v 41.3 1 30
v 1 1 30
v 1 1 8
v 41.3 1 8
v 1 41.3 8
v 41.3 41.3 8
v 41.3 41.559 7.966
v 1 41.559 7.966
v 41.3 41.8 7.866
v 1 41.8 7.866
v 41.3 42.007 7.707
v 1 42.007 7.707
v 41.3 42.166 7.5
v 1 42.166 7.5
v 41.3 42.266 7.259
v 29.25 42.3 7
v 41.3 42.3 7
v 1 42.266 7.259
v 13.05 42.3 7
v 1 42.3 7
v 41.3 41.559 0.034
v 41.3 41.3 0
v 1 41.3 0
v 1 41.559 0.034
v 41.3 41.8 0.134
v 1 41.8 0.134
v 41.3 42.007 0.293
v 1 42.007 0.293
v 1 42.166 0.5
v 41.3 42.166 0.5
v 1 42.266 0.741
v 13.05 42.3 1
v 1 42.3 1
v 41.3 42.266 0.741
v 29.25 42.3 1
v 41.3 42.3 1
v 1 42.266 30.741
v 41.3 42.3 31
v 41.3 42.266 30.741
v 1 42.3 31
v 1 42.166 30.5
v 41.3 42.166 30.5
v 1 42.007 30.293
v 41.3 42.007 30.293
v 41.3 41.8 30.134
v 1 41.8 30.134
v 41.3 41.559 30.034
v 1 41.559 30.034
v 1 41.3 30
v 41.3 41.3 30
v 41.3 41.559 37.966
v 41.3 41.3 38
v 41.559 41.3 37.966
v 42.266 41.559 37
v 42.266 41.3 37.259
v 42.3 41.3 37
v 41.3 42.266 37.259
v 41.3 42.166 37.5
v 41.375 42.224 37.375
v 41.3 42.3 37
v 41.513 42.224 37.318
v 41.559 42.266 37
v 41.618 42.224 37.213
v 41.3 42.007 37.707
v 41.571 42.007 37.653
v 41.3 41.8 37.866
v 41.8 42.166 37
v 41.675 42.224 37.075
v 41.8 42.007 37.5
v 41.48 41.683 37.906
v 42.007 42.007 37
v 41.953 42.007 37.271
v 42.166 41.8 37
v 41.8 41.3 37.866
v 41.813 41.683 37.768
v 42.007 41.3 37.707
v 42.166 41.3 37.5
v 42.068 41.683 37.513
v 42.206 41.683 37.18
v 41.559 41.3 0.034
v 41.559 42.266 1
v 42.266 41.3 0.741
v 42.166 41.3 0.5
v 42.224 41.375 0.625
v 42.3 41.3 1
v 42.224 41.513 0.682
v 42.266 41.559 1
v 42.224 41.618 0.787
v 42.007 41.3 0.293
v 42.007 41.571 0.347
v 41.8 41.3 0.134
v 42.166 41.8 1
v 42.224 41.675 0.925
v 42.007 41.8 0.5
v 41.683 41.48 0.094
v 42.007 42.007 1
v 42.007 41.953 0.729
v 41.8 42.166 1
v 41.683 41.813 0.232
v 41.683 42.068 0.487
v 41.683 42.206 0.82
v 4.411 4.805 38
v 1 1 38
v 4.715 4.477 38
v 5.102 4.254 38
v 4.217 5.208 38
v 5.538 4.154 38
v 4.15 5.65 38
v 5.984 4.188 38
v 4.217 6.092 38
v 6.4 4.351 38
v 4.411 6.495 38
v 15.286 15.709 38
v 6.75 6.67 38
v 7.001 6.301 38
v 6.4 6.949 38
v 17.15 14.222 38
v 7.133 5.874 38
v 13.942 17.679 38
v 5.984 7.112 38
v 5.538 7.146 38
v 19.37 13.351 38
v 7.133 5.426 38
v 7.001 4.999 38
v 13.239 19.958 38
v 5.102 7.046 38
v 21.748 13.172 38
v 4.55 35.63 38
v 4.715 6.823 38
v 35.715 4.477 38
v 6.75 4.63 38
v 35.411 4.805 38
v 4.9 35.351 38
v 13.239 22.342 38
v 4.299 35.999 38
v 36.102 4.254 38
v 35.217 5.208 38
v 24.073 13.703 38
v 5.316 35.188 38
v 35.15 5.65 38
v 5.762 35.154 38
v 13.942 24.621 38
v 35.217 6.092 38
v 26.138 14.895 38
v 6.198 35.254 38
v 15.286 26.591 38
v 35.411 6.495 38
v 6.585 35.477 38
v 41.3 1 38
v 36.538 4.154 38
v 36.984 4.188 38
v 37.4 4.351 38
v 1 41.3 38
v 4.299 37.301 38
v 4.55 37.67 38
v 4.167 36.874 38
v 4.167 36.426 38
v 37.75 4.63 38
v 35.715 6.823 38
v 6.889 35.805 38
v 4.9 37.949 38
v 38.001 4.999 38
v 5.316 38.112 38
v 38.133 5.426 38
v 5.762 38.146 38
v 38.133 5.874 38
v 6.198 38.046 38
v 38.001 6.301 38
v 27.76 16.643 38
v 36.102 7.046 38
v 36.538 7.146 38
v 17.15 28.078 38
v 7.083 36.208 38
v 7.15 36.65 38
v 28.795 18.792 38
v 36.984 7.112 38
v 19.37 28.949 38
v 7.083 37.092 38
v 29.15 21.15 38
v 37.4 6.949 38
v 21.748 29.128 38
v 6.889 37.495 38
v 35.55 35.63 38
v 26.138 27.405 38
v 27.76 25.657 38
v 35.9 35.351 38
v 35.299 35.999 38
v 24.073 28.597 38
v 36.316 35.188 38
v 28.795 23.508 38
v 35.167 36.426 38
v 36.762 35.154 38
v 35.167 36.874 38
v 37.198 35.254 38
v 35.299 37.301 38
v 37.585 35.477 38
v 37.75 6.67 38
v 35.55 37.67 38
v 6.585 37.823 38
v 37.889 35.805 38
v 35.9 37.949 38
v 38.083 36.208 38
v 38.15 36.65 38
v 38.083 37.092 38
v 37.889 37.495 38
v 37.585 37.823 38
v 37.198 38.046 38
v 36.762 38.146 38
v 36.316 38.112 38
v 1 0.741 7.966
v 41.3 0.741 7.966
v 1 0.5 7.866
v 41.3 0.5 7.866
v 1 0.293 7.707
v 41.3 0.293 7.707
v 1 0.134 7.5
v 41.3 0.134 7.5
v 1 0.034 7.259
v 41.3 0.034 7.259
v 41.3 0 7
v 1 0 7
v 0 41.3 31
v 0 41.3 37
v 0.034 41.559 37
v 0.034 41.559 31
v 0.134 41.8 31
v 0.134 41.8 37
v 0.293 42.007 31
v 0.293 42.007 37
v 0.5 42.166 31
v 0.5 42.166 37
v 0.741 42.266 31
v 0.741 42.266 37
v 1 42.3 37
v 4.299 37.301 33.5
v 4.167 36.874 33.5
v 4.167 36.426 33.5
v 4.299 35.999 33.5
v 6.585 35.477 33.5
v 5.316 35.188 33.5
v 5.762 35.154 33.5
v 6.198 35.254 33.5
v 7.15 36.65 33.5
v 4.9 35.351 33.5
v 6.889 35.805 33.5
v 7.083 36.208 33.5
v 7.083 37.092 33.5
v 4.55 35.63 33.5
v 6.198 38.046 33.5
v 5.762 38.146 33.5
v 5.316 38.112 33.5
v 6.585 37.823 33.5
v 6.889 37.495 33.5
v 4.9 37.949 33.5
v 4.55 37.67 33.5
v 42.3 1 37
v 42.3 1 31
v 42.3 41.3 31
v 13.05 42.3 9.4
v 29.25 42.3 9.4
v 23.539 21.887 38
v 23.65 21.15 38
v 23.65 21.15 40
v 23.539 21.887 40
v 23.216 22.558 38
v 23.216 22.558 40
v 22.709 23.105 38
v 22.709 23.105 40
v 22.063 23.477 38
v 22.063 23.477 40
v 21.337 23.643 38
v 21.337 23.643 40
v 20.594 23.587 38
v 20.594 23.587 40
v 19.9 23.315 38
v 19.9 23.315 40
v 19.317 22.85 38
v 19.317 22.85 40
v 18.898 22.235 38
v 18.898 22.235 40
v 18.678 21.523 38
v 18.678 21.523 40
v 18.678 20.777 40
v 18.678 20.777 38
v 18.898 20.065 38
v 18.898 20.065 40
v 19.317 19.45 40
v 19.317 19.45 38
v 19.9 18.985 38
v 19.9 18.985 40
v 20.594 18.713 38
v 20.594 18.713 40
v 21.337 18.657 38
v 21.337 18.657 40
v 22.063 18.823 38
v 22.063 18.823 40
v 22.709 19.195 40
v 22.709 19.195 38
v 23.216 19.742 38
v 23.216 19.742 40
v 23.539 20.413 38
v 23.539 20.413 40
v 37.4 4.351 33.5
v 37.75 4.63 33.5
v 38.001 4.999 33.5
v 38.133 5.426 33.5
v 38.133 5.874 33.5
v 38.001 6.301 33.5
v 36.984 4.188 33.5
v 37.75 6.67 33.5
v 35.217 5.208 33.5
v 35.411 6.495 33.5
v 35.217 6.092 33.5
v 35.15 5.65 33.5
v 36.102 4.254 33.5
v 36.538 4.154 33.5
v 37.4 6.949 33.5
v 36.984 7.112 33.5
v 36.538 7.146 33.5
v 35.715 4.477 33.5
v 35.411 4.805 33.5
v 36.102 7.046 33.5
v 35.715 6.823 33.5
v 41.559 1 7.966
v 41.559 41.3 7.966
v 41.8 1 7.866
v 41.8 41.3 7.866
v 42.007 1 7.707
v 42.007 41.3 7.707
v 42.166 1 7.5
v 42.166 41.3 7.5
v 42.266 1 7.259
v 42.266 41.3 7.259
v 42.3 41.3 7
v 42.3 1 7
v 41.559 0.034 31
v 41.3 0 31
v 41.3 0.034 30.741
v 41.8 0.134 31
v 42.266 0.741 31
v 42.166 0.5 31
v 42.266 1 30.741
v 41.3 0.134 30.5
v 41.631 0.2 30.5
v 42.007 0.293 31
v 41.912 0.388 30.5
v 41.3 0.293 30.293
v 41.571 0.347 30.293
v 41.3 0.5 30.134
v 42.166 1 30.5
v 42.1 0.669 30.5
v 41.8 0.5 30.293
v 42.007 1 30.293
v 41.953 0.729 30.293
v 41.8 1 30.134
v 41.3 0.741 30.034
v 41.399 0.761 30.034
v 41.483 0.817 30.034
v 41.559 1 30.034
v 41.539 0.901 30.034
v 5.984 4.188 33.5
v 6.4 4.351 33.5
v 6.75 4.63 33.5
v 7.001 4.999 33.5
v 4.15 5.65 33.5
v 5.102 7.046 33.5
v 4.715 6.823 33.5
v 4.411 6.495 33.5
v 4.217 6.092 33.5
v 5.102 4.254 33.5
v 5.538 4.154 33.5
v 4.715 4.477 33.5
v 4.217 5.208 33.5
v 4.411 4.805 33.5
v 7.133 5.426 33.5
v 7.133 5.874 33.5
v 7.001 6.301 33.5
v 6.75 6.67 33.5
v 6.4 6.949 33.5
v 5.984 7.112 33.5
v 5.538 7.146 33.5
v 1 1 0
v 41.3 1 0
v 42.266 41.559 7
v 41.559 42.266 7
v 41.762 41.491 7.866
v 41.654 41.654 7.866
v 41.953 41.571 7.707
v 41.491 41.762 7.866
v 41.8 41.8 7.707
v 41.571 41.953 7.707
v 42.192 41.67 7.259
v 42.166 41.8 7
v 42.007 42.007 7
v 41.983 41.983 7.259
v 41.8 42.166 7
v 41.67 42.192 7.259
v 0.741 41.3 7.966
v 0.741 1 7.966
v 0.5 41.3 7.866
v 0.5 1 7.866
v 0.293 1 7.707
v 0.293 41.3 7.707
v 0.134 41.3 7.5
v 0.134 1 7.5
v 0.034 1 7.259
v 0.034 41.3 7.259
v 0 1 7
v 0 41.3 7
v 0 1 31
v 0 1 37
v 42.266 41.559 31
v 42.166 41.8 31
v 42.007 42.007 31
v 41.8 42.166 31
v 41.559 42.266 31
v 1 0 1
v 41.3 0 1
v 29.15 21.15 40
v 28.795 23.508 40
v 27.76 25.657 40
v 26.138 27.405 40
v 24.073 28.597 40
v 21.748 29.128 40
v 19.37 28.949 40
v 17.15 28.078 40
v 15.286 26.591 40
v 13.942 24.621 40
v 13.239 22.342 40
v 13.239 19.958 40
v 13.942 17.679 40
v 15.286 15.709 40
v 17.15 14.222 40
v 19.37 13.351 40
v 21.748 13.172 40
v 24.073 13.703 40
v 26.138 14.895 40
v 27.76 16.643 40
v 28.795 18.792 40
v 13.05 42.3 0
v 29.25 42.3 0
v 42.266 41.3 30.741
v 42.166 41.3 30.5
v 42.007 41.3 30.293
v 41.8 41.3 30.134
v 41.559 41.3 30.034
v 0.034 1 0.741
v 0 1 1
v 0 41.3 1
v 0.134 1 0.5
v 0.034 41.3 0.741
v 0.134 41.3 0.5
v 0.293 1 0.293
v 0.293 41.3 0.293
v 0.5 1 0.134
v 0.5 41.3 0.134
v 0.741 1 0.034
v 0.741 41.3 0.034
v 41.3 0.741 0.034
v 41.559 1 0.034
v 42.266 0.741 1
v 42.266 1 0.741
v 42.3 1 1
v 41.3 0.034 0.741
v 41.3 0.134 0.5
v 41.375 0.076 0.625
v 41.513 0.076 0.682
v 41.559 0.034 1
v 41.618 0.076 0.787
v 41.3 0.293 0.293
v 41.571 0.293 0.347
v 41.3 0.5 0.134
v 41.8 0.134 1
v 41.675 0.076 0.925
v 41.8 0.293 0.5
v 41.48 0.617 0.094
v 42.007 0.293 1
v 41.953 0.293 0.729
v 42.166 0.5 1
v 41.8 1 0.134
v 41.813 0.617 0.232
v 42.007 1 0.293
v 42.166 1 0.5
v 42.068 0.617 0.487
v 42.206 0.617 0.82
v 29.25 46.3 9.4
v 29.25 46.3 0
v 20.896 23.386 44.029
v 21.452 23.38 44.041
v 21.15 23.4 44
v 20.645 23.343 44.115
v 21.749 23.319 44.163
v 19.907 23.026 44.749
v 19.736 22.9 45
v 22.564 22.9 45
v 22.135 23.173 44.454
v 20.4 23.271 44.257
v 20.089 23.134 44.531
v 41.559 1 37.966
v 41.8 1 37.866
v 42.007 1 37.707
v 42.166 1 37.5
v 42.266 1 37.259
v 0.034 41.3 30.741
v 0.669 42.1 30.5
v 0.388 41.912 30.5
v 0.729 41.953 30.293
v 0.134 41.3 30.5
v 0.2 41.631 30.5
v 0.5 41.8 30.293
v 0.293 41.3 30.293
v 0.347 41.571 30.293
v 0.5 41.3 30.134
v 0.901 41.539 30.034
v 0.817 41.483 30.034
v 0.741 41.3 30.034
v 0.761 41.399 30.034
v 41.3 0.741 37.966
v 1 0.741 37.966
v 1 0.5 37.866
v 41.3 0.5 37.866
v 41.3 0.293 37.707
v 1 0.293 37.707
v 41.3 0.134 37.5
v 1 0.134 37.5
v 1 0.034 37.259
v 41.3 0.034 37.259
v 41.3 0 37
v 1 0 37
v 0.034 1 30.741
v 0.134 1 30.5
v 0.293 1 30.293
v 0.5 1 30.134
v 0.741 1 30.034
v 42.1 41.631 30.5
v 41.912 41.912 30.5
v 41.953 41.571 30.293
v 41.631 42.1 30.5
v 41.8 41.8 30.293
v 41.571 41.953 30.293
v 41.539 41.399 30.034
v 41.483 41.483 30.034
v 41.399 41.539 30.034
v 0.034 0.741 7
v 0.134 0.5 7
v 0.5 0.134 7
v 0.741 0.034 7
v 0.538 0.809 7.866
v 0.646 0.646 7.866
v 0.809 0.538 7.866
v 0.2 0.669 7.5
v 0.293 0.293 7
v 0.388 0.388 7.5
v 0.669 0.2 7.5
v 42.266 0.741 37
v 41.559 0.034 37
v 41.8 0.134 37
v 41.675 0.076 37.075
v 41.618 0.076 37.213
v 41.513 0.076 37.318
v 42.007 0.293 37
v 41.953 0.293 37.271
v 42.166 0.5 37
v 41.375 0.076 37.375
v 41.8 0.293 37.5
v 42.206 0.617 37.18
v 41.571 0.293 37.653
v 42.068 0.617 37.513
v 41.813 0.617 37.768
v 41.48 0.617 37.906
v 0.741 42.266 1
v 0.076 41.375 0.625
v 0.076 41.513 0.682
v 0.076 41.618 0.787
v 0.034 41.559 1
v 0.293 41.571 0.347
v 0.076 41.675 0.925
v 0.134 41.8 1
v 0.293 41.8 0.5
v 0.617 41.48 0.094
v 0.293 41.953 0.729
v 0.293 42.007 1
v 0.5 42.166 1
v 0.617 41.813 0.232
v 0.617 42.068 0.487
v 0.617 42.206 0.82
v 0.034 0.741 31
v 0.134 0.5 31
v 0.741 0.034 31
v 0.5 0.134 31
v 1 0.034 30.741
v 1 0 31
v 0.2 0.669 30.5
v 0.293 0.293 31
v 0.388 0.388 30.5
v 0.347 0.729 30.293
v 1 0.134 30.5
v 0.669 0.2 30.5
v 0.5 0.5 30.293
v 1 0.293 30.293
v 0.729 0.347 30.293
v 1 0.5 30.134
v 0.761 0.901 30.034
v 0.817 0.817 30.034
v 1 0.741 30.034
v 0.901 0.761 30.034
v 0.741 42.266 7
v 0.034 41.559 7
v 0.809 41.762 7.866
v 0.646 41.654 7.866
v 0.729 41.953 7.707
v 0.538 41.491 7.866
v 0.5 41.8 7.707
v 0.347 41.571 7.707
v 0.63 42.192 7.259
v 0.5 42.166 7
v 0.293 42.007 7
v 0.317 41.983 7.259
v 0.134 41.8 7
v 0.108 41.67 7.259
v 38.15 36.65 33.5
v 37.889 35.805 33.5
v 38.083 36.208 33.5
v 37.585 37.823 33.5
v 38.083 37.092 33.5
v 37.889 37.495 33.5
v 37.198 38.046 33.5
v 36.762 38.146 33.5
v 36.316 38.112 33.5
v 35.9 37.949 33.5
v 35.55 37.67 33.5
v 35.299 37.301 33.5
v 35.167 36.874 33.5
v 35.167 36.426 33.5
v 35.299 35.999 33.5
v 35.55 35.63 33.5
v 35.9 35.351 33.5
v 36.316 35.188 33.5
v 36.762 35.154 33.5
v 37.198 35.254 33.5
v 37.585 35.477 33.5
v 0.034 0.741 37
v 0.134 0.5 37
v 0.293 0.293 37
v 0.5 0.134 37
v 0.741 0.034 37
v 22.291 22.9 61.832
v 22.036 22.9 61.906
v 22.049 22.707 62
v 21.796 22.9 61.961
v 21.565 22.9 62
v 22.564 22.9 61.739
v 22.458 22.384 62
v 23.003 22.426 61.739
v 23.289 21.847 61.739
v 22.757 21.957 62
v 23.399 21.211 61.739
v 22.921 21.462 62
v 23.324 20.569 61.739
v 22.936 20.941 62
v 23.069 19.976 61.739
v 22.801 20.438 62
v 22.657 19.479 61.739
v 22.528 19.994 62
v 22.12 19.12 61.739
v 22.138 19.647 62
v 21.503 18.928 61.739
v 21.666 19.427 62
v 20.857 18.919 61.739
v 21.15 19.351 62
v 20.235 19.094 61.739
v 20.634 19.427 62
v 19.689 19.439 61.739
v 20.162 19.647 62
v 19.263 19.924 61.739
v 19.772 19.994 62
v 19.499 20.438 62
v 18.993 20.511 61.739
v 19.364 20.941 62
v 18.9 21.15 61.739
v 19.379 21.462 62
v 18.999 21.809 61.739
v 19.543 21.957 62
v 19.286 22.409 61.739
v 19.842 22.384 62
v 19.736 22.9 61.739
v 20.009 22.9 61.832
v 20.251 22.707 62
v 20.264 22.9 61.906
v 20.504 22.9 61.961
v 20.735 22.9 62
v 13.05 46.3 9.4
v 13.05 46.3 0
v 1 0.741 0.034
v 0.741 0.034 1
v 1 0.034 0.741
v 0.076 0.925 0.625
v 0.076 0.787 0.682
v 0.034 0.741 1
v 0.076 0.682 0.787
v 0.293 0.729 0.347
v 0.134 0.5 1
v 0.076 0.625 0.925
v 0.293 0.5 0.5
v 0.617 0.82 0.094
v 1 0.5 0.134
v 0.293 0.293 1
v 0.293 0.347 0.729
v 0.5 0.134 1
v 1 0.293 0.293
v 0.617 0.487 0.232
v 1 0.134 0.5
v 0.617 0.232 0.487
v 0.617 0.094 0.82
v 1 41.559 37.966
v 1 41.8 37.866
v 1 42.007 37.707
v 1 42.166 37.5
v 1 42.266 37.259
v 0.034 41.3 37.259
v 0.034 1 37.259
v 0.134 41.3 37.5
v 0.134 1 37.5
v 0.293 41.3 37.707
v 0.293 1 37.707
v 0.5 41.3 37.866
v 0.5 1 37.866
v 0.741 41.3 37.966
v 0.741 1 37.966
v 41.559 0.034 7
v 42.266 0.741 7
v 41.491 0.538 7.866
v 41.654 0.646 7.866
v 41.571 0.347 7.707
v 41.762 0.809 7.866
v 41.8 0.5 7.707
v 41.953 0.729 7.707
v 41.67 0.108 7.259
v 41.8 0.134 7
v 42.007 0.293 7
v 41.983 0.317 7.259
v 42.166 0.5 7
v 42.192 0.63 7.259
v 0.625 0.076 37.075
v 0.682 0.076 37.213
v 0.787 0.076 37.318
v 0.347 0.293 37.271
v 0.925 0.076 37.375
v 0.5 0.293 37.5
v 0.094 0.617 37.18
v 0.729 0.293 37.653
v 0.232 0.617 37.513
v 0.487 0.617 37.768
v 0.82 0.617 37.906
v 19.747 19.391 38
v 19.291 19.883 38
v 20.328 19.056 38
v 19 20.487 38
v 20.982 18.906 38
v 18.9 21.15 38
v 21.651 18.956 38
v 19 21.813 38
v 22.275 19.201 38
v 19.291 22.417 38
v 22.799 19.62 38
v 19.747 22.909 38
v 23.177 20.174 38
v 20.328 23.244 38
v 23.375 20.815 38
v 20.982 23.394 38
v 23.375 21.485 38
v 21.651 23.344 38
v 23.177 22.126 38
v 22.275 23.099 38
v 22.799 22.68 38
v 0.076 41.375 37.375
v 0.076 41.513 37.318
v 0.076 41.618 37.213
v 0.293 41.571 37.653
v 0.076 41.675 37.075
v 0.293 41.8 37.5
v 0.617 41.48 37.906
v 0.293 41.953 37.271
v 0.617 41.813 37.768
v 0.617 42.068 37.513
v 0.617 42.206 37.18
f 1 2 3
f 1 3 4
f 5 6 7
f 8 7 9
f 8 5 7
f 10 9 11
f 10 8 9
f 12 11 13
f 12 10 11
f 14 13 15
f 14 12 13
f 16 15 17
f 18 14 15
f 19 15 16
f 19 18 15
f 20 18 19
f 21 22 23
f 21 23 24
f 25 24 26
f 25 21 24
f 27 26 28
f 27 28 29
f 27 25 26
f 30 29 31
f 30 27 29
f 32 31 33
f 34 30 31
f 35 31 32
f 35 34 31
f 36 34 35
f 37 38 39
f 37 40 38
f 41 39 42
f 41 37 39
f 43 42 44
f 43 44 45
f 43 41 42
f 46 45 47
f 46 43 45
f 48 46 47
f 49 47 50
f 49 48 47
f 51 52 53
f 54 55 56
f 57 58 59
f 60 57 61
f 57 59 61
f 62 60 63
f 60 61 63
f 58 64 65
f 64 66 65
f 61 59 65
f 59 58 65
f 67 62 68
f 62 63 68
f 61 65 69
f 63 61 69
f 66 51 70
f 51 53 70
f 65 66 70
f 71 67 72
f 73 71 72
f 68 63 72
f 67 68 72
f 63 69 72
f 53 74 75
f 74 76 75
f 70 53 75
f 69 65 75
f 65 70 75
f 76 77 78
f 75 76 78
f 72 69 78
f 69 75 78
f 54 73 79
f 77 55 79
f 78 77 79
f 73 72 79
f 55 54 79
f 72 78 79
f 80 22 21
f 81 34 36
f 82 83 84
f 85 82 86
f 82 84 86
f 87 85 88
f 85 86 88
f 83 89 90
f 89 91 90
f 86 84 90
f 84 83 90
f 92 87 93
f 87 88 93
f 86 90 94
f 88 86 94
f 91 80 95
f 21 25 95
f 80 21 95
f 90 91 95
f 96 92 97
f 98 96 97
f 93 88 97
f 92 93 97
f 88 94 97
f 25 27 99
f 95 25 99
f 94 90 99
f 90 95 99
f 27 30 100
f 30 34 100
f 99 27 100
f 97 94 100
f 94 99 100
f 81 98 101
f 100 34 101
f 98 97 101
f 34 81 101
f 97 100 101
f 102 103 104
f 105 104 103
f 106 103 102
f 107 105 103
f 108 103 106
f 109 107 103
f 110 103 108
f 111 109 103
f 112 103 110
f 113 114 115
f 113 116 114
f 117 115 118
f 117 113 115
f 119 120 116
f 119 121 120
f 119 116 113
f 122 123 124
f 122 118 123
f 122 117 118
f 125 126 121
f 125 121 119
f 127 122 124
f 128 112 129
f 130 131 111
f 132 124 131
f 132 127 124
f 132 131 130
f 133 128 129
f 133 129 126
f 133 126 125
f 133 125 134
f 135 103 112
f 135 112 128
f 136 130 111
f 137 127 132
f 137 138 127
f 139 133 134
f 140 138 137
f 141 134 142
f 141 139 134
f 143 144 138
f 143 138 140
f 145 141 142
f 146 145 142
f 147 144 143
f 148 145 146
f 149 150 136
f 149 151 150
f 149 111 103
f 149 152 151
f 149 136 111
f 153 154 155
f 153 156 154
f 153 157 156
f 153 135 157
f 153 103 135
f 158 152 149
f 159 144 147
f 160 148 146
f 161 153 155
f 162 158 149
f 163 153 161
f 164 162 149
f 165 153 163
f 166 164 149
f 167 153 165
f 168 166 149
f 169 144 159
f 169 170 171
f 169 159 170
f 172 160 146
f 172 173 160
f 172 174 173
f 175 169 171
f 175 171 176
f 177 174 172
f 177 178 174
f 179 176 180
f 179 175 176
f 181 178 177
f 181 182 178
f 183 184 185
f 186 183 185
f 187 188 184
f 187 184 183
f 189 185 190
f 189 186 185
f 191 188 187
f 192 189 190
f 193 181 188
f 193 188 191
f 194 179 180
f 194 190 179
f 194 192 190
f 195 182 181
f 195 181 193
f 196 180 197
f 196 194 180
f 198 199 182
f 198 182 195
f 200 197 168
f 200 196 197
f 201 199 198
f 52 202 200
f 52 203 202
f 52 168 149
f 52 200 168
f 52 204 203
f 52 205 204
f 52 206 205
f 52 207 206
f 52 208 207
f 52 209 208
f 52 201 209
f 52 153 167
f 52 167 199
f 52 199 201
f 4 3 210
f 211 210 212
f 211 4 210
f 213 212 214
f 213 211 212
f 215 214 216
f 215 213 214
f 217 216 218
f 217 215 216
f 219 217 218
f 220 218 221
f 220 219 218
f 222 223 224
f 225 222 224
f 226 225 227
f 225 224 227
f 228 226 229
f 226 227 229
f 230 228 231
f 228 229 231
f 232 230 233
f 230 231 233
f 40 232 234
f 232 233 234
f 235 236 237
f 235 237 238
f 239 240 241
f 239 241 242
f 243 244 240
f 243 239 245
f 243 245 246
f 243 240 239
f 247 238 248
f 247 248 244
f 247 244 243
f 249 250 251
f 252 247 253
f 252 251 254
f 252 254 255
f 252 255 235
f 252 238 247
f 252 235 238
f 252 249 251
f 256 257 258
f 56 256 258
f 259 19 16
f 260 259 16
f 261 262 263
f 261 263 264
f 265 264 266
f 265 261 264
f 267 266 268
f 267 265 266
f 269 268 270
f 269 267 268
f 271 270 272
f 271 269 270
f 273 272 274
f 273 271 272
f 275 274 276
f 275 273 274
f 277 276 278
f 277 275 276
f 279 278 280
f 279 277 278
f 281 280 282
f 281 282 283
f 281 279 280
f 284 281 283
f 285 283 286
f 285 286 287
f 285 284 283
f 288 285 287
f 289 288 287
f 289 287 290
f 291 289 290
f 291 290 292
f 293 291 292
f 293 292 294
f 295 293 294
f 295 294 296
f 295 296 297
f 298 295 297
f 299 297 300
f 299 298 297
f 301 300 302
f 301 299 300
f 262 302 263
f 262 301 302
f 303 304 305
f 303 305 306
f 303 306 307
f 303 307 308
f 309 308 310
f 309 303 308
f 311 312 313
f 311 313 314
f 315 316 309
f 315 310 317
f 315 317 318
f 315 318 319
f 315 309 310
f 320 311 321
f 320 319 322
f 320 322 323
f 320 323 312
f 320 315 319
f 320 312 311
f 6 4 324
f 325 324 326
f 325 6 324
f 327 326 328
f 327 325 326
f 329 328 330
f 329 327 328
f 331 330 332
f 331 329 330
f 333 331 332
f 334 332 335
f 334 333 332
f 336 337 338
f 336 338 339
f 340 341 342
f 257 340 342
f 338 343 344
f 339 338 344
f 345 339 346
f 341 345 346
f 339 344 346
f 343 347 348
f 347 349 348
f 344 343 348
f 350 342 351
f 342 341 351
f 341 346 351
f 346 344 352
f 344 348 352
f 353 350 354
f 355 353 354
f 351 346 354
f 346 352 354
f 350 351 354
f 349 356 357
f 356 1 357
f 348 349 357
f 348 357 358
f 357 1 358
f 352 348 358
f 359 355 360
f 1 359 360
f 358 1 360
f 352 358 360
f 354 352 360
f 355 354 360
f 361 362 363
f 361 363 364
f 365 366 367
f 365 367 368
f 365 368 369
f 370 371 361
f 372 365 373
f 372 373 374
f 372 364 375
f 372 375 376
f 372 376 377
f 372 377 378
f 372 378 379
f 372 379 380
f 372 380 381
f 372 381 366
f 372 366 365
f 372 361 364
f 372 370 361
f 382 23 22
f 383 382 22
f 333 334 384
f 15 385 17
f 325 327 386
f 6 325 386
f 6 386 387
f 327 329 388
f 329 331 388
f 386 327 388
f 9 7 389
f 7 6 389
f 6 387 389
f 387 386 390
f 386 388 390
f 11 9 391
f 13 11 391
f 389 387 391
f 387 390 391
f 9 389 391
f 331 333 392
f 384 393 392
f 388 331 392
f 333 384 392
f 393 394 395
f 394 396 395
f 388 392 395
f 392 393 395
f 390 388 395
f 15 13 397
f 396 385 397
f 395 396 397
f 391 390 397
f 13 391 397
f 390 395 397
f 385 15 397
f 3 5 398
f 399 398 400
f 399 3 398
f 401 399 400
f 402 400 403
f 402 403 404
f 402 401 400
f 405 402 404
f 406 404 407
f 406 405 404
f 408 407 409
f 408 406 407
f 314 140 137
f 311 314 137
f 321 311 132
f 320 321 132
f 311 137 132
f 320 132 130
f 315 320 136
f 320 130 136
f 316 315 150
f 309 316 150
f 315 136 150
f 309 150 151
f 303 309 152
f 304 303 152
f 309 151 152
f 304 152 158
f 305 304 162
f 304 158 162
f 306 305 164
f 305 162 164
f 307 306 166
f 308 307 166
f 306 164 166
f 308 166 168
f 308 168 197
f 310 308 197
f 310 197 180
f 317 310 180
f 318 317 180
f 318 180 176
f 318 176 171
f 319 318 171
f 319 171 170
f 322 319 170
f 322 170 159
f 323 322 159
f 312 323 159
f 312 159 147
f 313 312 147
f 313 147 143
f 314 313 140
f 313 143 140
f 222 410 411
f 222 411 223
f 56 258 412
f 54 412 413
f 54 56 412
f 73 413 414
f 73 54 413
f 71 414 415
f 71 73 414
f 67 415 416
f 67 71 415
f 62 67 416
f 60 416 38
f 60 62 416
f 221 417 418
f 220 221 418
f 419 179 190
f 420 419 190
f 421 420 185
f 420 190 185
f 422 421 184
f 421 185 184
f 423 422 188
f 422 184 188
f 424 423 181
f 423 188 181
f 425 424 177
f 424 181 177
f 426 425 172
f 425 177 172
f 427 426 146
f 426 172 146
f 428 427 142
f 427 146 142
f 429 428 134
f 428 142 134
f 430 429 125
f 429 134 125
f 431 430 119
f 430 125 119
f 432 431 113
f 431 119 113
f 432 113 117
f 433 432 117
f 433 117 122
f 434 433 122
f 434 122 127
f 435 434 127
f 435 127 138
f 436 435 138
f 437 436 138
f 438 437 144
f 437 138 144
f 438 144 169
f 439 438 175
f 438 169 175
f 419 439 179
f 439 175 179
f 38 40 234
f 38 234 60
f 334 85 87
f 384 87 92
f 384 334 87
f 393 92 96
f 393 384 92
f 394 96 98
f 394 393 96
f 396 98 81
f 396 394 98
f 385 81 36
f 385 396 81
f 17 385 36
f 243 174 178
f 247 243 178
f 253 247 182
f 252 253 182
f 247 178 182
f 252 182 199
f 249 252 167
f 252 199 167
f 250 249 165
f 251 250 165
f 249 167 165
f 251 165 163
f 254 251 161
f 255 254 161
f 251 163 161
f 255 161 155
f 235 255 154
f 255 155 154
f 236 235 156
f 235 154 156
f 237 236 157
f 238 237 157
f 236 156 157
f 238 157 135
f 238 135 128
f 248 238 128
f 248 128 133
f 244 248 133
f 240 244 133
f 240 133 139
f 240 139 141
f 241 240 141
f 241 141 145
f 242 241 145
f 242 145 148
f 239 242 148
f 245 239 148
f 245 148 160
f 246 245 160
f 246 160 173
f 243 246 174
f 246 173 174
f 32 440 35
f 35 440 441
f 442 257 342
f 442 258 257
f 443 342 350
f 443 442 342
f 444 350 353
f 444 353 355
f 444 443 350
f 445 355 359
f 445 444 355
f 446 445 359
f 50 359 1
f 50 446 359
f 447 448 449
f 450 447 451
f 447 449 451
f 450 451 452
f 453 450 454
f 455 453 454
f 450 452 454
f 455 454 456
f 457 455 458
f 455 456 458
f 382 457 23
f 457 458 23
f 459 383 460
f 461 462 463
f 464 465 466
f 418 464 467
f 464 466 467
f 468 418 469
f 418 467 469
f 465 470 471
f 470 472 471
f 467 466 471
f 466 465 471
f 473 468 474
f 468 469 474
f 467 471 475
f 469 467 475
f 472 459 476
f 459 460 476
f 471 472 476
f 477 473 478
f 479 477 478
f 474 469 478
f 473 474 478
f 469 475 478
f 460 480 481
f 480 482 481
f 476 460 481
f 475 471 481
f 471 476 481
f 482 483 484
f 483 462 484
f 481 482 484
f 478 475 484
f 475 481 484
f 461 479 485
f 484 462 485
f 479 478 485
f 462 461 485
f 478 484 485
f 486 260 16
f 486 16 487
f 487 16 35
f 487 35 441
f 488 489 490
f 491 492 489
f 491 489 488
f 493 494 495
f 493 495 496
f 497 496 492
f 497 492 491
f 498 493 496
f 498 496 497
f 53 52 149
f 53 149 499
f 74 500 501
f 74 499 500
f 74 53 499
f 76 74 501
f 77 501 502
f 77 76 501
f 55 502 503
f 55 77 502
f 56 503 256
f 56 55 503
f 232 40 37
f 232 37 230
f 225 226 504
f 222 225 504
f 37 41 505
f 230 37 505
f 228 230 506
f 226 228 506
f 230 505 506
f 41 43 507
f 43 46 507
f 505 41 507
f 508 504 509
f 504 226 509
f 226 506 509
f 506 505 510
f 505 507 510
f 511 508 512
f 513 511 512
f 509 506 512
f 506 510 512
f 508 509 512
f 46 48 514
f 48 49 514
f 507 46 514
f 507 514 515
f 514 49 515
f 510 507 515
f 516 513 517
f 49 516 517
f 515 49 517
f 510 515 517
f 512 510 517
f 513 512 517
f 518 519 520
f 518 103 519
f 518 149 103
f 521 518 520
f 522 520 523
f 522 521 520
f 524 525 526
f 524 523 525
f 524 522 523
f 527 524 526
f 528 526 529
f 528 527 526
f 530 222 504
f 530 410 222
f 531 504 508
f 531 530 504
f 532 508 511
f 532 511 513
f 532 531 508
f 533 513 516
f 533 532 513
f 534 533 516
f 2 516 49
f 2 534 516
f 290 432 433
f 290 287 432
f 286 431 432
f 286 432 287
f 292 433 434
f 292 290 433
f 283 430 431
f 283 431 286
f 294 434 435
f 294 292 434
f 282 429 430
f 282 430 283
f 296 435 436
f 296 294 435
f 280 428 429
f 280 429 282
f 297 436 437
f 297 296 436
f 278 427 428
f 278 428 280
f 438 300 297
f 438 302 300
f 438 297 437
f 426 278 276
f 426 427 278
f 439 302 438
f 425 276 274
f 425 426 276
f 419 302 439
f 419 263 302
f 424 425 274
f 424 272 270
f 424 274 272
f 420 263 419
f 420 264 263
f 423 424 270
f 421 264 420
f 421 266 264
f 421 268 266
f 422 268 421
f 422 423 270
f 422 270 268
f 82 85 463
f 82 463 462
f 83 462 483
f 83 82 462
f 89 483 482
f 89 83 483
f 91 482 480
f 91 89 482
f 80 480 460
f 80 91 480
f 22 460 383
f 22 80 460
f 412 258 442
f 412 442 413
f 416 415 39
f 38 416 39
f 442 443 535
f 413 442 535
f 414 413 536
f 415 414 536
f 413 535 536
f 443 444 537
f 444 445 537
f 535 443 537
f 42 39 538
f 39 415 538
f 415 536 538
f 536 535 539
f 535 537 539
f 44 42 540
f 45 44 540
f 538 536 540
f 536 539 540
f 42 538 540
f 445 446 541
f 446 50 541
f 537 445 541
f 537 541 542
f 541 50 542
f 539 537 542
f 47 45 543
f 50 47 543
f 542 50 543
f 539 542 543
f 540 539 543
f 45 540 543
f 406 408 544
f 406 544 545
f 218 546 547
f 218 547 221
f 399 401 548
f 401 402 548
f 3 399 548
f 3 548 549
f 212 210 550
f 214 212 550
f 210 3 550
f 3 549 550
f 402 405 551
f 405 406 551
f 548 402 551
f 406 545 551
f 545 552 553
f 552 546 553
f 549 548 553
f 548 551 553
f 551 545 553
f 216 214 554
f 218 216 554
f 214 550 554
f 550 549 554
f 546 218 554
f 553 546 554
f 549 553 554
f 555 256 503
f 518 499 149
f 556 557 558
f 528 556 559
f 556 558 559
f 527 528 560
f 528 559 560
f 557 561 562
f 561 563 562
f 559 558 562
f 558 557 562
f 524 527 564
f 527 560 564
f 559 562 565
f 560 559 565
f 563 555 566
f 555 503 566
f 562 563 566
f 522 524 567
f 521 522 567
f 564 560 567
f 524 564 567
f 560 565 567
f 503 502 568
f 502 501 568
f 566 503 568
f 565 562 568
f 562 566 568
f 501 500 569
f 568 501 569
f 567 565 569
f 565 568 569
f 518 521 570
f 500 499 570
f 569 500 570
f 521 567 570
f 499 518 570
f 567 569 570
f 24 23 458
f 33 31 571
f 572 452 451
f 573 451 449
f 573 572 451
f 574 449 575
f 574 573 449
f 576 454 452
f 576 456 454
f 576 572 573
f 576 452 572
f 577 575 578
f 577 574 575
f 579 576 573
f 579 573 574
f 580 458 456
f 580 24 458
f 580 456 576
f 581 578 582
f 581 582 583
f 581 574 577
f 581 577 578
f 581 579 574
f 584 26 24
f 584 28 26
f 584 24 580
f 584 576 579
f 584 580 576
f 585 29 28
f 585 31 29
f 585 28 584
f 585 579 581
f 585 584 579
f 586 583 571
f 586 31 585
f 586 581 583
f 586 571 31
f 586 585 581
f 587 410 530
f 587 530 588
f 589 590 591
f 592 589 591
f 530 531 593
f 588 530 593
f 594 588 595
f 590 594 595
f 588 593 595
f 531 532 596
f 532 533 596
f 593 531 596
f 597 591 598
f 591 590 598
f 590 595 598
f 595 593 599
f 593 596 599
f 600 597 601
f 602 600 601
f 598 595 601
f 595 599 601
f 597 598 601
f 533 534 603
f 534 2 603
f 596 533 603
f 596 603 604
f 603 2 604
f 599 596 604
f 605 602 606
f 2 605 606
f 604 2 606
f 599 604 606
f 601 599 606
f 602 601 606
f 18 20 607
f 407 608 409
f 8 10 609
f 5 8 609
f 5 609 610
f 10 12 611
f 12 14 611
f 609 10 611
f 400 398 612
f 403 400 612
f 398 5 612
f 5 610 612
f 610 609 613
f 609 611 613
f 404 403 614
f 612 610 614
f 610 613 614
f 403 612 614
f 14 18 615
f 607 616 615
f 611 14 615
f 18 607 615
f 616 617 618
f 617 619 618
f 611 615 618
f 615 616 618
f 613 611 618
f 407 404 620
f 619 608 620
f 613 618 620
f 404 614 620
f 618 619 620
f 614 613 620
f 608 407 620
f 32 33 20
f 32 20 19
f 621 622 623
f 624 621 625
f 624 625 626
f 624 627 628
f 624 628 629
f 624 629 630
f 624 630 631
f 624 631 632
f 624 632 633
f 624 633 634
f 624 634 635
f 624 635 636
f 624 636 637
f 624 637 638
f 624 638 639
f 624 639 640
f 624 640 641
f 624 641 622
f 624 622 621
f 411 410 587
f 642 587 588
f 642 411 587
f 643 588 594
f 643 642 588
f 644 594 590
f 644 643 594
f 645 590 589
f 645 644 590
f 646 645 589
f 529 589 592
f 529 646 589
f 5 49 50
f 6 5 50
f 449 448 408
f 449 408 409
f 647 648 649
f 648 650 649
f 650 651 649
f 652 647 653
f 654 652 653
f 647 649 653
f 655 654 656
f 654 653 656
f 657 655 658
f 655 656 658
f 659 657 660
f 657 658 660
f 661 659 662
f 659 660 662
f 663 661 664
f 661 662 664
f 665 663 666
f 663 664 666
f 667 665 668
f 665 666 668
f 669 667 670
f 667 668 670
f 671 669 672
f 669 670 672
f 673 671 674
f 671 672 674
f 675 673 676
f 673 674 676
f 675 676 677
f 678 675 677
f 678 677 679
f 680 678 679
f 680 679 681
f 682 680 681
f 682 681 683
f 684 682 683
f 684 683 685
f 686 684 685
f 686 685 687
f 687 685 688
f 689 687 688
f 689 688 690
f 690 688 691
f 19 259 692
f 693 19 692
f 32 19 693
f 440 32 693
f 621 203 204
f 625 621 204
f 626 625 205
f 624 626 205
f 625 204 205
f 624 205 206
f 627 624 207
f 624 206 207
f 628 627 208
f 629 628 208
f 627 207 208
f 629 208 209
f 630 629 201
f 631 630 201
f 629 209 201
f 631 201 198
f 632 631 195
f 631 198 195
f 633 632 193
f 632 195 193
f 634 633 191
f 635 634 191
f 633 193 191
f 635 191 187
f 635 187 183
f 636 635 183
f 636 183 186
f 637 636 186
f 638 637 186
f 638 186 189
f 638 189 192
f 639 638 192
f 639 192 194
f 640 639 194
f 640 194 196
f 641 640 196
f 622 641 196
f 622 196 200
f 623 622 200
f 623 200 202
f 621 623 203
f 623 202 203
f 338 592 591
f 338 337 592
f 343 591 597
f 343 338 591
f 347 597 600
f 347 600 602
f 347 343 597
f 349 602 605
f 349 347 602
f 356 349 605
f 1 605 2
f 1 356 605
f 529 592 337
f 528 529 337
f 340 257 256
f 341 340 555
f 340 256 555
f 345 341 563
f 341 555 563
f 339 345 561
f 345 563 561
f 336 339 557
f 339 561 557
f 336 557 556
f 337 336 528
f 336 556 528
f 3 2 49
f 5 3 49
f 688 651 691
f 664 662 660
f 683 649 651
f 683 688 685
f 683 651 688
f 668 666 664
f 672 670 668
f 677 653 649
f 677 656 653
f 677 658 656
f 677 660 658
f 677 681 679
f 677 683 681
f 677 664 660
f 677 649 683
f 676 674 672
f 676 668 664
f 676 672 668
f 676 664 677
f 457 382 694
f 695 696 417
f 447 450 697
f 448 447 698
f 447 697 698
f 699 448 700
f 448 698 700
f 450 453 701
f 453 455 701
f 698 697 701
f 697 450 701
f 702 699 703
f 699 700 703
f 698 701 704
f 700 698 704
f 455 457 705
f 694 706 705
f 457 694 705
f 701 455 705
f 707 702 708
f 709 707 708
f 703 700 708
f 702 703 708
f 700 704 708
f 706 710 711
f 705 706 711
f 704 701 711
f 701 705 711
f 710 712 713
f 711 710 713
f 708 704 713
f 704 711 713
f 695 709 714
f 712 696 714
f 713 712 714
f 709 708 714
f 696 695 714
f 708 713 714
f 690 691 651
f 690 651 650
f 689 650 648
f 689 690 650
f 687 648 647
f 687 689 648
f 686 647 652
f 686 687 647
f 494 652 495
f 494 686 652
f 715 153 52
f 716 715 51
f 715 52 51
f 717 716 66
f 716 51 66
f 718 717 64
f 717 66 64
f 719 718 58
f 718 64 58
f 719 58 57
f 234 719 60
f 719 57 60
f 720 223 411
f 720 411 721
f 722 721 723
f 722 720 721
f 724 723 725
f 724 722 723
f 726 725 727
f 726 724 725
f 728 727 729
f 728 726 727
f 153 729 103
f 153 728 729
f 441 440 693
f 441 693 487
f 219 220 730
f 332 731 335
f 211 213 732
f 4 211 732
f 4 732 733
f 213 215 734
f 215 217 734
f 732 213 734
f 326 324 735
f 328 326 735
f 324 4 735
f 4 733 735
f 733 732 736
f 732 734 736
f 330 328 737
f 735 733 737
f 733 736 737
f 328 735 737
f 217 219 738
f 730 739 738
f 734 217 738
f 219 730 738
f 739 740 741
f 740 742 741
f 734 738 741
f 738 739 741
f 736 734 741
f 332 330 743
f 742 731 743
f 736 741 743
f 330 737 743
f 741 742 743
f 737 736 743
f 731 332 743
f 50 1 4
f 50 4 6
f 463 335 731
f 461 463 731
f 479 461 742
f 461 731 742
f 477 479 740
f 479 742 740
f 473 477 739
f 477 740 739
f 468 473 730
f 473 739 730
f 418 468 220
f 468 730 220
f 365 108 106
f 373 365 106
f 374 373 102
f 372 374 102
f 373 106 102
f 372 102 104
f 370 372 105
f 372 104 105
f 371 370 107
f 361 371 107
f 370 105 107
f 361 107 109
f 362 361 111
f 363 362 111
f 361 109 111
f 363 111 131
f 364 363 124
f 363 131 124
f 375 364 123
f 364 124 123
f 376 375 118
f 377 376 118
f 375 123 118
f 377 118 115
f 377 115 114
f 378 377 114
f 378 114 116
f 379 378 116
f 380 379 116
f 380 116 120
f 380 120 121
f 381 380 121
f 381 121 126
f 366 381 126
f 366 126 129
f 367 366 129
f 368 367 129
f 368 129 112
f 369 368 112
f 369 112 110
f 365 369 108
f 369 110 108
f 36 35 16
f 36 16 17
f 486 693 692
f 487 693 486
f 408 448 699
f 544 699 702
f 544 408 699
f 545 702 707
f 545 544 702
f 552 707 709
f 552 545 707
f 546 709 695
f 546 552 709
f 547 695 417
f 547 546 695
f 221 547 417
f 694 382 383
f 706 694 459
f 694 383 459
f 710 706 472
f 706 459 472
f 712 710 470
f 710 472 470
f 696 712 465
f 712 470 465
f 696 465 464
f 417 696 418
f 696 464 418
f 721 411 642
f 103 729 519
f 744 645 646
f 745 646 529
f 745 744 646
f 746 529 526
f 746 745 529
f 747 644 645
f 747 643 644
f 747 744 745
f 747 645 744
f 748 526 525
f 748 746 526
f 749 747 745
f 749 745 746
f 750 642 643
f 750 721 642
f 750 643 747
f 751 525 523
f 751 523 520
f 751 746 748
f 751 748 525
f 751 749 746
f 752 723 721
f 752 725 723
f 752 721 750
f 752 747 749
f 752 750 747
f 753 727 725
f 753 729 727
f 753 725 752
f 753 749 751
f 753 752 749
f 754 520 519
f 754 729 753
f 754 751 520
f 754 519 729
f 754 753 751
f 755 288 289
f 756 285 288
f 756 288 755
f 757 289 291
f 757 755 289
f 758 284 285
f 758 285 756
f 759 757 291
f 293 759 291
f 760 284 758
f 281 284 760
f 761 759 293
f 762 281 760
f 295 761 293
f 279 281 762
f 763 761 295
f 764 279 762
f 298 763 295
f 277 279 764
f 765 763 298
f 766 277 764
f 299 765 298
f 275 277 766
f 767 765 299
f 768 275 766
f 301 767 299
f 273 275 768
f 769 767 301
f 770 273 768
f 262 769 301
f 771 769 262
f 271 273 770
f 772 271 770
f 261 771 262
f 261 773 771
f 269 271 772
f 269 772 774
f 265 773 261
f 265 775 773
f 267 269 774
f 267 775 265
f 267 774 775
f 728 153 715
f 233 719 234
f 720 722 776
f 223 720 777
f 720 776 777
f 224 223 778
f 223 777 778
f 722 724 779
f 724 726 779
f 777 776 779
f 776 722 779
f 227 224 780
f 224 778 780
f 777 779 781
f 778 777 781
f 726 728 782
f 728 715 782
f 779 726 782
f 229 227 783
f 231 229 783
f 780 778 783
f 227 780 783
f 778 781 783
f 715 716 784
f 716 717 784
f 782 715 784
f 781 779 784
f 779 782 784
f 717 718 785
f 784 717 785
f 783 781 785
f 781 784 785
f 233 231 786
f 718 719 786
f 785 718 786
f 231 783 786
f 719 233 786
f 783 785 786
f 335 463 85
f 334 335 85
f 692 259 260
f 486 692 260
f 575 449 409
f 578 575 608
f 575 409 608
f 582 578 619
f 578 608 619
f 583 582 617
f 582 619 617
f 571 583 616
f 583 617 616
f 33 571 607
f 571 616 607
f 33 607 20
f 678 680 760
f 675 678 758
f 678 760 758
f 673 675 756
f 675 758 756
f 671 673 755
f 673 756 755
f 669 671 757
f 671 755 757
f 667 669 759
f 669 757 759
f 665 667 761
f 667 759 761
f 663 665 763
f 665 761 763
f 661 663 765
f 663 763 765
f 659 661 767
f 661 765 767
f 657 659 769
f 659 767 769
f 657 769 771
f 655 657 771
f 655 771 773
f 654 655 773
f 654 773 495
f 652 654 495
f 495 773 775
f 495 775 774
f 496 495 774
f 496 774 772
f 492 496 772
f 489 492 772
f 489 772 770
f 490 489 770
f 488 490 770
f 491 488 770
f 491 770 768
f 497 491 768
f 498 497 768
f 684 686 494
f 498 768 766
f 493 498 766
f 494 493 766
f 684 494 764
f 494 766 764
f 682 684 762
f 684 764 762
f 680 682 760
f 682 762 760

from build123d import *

# Parameters (mm, degrees)
SKETCH_1_W          = 42.3
SKETCH_1_H          = 42.3
EXTRUDE_1_DEPTH     = 38
SKETCH_3_R          = 1.5
CUT_EXTRUDE_1_DEPTH = 4.5
SKETCH_4_R          = 8
SKETCH_4_R_2        = 2.5
EXTRUDE_2_DEPTH     = 2
SKETCH_5_R          = 2.25
EXTRUDE_3_DEPTH     = 24
CUT_EXTRUDE_2_DEPTH = 24
FILLET_1_R          = 1
CUT_EXTRUDE_START   = -8
SKETCH_10_W         = 42.3
SKETCH_10_H         = 42.3
SKETCH_10_W_2       = 40.3
SKETCH_10_H_2       = 40.3
CUT_EXTRUDE_4_DEPTH = 22
FILLET_2_R          = 1
SKETCH_11_W         = 16.2
SKETCH_11_H         = 9.4
EXTRUDE_4_DEPTH     = 4


with BuildPart() as part:
    # 草图1 → 凸台-拉伸1 (new body)
    with BuildSketch(Plane.XY):
        with Locations((21.15, 21.15)):
            Rectangle(SKETCH_1_W, SKETCH_1_H)
    extrude(amount=EXTRUDE_1_DEPTH)

    # 草图3 → 切除-拉伸1 (cut)
    with BuildSketch(Plane.XY.offset(38)):
        with Locations((5.65, 36.65)):
            Circle(SKETCH_3_R)
        with Locations((36.65, 36.65)):
            Circle(SKETCH_3_R)
        with Locations(Location((36.65, 5.65, 0), (0, 0, 180))):
            Circle(SKETCH_3_R)
        with Locations(Location((5.65, 5.65, 0), (0, 0, 180))):
            Circle(SKETCH_3_R)
    extrude(amount=-CUT_EXTRUDE_1_DEPTH, mode=Mode.SUBTRACT)

    # 草图4 → 凸台-拉伸2 (add)
    with BuildSketch(Plane.XY.offset(38)):
        with Locations((21.15, 21.15)):
            Circle(SKETCH_4_R)
        with Locations((21.15, 21.15)):
            Circle(SKETCH_4_R_2, mode=Mode.SUBTRACT)
    extrude(amount=EXTRUDE_2_DEPTH)

    # 草图5 → 凸台-拉伸3 (add)
    with BuildSketch(Plane.XY.offset(38)):
        with Locations(Location((21.15, 21.15, 0), (0, 0, 180))):
            Circle(SKETCH_5_R)
    extrude(amount=EXTRUDE_3_DEPTH)

    # 草图6 → 切除-拉伸2 (cut)
    with BuildSketch(Plane(origin=(0, 0, 0), x_dir=(0, 0, -1), z_dir=(1, 0, 0))):
        Polygon((-62, 22.9), (-45, 22.9), (-44, 23.4), (-62, 23.4), align=None)
    extrude(amount=CUT_EXTRUDE_2_DEPTH, mode=Mode.SUBTRACT)

    # 草图9 → 切除-旋转1 (revolve, cut)
    with BuildSketch(Plane(origin=(0, 21.15, 0), x_dir=(1, 0, 0), z_dir=(0, 1, 0)), mode=Mode.PRIVATE) as cut_revolve_1_sk:
        Polygon((23.4, -61.739352103), (22.6, -62.201232319), (23.4, -62.201232319), align=None)
    revolve(cut_revolve_1_sk.sketch.rotate(Axis((21.15, 21.15, 62), (0, 0, -1)), 180), axis=Axis((21.15, 21.15, 62), (0, 0, -1)), mode=Mode.SUBTRACT)

    # 圆角1
    fillet_1_edges = [part.edges().sort_by_distance(p)[0] for p in [
        (42.3, 21.15, 38),
        (21.15, 42.3, 38),
        (0, 21.15, 38),
        (21.15, 42.3, 0),
        (42.3, 21.15, 0),
        (21.15, 0, 0),
        (0, 21.15, 0),
        (0, 42.3, 19),
        (42.3, 42.3, 19),
        (42.3, 0, 19),
        (0, 0, 19),
        (21.15, 0, 38),
    ]]
    fillet(fillet_1_edges, radius=FILLET_1_R)

    # 草图10 → 切除-拉伸4 (cut)
    with BuildSketch(Plane.XY.offset(38).offset(CUT_EXTRUDE_START)):
        with Locations((21.15, 21.15)):
            Rectangle(SKETCH_10_W, SKETCH_10_H)
        with Locations((21.15, 21.15)):
            Rectangle(SKETCH_10_W_2, SKETCH_10_H_2, mode=Mode.SUBTRACT)
    extrude(amount=-CUT_EXTRUDE_4_DEPTH, mode=Mode.SUBTRACT)

    # 圆角2
    fillet_2_edges = [part.edges().sort_by_distance(p)[0] for p in [
        (0.292893219, 0.292893219, 30),
        (0.292893219, 0.292893219, 8),
        (42.3, 21.15, 8),
        (21.15, 42.3, 8),
        (0, 21.15, 8),
        (21.15, 0, 8),
        (42.007106781, 42.007106781, 30),
        (42.007106781, 0.292893219, 30),
        (0.292893219, 42.007106781, 30),
        (42.007106781, 42.007106781, 8),
        (42.007106781, 0.292893219, 8),
        (0.292893219, 42.007106781, 8),
        (21.15, 42.3, 30),
        (0, 21.15, 30),
        (21.15, 0, 30),
        (42.3, 21.15, 30),
    ]]
    fillet(fillet_2_edges, radius=FILLET_2_R - 0.0001)  # a hair under: the kernel refuses the full size

    # 草图11 → 凸台-拉伸4 (add)
    with BuildSketch(Plane(origin=(0, 42.3, 0), x_dir=(1, 0, 0), z_dir=(0, 1, 0))):
        with Locations((21.15, -4.7)):
            Rectangle(SKETCH_11_W, SKETCH_11_H)
    extrude(amount=EXTRUDE_4_DEPTH)


solid = part.part
